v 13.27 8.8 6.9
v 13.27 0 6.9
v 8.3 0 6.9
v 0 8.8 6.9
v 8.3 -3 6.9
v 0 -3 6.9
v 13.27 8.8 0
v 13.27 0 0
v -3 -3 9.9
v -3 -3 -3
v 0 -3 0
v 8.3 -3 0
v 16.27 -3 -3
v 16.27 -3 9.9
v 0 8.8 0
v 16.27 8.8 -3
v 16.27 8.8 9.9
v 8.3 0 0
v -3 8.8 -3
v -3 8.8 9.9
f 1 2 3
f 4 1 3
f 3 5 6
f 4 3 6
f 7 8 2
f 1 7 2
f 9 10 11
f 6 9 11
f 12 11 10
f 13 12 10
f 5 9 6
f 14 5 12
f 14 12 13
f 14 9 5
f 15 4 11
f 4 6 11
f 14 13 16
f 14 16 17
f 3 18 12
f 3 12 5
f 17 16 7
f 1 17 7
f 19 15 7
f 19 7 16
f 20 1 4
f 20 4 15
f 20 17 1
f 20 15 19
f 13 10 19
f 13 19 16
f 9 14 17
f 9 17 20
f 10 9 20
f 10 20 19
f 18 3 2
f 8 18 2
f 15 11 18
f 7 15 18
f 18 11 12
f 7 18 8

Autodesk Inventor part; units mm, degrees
ref_plane "YZ Plane" through (0, 0, 0) normal (1, 0, 0) x (0, 1, 0)
ref_plane "XZ Plane" through (0, 0, 0) normal (0, 1, 0) x (-1, 0, 0)
ref_plane "XY Plane" through (0, 0, 0) normal (0, 0, 1) x (1, 0, 0)
sketch "Sketch1" plane through (0, 0, 0) normal (0, 1, 0) x (-1, 0, 0)
  line L0 (0, 0) -> (-13.27, 0)
  line L1 (-13.27, 0) -> (-13.27, 6.9)
  line L2 (-13.27, 6.9) -> (0, 6.9)
  line L3 (0, 6.9) -> (0, 0)
  line L4 (3, -3) -> (-16.27, -3)
  line L5 (-16.27, -3) -> (-16.27, 9.9)
  line L6 (-16.27, 9.9) -> (3, 9.9)
  line L7 (3, 9.9) -> (3, -3)
  point P0 (-6.635, -3)
  point P1 (-6.635, 0)
  point P2 (3, 3.45)
  dimension "d0" = 13.27
  dimension "d1" = 6.9
  dimension "d2" = 3
  dimension "d3" = 3
  dimension "d4" = 3
  dimension "d5" = 3
extrude "Extrusion1" add sketch "Sketch1" along normal blind 8.8
sketch "Sketch2" plane through (0, 0, 0) normal (0, -1, 0) x (1, 0, 0)
  line L0 (-3, 9.9) -> (16.27, 9.9) projected
  line L1 (16.27, -3) -> (-3, -3) projected
  line L2 (-3, 9.9) -> (16.27, 9.9)
  line L3 (16.27, 9.9) -> (16.27, -3)
  line L4 (16.27, -3) -> (-3, -3)
  line L5 (-3, -3) -> (-3, 9.9)
  point P0 (0, 0)
  point P1 (16.27, 9.9)
extrude "Extrusion2" add sketch "Sketch2" along normal blind 3
sketch "Sketch3" plane through (0, 0, 0) normal (0, 1, 0) x (1, 0, 0)
  line L0 (0, -6.9) -> (0, 0) projected
  line L1 (13.27, -6.9) -> (0, -6.9) projected
  line L2 (0, 0) -> (8.3, 0)
  line L3 (8.3, 0) -> (8.3, -6.9)
  line L4 (8.3, -6.9) -> (0, -6.9)
  line L5 (0, -6.9) -> (0, 0)
  dimension "d10" = 8.3
extrude "Extrusion3" cut sketch "Sketch3" against normal blind 3
equation "\"d3\" = d2"
equation "\"d5\" = d4"
properties part number "switch test v03"
